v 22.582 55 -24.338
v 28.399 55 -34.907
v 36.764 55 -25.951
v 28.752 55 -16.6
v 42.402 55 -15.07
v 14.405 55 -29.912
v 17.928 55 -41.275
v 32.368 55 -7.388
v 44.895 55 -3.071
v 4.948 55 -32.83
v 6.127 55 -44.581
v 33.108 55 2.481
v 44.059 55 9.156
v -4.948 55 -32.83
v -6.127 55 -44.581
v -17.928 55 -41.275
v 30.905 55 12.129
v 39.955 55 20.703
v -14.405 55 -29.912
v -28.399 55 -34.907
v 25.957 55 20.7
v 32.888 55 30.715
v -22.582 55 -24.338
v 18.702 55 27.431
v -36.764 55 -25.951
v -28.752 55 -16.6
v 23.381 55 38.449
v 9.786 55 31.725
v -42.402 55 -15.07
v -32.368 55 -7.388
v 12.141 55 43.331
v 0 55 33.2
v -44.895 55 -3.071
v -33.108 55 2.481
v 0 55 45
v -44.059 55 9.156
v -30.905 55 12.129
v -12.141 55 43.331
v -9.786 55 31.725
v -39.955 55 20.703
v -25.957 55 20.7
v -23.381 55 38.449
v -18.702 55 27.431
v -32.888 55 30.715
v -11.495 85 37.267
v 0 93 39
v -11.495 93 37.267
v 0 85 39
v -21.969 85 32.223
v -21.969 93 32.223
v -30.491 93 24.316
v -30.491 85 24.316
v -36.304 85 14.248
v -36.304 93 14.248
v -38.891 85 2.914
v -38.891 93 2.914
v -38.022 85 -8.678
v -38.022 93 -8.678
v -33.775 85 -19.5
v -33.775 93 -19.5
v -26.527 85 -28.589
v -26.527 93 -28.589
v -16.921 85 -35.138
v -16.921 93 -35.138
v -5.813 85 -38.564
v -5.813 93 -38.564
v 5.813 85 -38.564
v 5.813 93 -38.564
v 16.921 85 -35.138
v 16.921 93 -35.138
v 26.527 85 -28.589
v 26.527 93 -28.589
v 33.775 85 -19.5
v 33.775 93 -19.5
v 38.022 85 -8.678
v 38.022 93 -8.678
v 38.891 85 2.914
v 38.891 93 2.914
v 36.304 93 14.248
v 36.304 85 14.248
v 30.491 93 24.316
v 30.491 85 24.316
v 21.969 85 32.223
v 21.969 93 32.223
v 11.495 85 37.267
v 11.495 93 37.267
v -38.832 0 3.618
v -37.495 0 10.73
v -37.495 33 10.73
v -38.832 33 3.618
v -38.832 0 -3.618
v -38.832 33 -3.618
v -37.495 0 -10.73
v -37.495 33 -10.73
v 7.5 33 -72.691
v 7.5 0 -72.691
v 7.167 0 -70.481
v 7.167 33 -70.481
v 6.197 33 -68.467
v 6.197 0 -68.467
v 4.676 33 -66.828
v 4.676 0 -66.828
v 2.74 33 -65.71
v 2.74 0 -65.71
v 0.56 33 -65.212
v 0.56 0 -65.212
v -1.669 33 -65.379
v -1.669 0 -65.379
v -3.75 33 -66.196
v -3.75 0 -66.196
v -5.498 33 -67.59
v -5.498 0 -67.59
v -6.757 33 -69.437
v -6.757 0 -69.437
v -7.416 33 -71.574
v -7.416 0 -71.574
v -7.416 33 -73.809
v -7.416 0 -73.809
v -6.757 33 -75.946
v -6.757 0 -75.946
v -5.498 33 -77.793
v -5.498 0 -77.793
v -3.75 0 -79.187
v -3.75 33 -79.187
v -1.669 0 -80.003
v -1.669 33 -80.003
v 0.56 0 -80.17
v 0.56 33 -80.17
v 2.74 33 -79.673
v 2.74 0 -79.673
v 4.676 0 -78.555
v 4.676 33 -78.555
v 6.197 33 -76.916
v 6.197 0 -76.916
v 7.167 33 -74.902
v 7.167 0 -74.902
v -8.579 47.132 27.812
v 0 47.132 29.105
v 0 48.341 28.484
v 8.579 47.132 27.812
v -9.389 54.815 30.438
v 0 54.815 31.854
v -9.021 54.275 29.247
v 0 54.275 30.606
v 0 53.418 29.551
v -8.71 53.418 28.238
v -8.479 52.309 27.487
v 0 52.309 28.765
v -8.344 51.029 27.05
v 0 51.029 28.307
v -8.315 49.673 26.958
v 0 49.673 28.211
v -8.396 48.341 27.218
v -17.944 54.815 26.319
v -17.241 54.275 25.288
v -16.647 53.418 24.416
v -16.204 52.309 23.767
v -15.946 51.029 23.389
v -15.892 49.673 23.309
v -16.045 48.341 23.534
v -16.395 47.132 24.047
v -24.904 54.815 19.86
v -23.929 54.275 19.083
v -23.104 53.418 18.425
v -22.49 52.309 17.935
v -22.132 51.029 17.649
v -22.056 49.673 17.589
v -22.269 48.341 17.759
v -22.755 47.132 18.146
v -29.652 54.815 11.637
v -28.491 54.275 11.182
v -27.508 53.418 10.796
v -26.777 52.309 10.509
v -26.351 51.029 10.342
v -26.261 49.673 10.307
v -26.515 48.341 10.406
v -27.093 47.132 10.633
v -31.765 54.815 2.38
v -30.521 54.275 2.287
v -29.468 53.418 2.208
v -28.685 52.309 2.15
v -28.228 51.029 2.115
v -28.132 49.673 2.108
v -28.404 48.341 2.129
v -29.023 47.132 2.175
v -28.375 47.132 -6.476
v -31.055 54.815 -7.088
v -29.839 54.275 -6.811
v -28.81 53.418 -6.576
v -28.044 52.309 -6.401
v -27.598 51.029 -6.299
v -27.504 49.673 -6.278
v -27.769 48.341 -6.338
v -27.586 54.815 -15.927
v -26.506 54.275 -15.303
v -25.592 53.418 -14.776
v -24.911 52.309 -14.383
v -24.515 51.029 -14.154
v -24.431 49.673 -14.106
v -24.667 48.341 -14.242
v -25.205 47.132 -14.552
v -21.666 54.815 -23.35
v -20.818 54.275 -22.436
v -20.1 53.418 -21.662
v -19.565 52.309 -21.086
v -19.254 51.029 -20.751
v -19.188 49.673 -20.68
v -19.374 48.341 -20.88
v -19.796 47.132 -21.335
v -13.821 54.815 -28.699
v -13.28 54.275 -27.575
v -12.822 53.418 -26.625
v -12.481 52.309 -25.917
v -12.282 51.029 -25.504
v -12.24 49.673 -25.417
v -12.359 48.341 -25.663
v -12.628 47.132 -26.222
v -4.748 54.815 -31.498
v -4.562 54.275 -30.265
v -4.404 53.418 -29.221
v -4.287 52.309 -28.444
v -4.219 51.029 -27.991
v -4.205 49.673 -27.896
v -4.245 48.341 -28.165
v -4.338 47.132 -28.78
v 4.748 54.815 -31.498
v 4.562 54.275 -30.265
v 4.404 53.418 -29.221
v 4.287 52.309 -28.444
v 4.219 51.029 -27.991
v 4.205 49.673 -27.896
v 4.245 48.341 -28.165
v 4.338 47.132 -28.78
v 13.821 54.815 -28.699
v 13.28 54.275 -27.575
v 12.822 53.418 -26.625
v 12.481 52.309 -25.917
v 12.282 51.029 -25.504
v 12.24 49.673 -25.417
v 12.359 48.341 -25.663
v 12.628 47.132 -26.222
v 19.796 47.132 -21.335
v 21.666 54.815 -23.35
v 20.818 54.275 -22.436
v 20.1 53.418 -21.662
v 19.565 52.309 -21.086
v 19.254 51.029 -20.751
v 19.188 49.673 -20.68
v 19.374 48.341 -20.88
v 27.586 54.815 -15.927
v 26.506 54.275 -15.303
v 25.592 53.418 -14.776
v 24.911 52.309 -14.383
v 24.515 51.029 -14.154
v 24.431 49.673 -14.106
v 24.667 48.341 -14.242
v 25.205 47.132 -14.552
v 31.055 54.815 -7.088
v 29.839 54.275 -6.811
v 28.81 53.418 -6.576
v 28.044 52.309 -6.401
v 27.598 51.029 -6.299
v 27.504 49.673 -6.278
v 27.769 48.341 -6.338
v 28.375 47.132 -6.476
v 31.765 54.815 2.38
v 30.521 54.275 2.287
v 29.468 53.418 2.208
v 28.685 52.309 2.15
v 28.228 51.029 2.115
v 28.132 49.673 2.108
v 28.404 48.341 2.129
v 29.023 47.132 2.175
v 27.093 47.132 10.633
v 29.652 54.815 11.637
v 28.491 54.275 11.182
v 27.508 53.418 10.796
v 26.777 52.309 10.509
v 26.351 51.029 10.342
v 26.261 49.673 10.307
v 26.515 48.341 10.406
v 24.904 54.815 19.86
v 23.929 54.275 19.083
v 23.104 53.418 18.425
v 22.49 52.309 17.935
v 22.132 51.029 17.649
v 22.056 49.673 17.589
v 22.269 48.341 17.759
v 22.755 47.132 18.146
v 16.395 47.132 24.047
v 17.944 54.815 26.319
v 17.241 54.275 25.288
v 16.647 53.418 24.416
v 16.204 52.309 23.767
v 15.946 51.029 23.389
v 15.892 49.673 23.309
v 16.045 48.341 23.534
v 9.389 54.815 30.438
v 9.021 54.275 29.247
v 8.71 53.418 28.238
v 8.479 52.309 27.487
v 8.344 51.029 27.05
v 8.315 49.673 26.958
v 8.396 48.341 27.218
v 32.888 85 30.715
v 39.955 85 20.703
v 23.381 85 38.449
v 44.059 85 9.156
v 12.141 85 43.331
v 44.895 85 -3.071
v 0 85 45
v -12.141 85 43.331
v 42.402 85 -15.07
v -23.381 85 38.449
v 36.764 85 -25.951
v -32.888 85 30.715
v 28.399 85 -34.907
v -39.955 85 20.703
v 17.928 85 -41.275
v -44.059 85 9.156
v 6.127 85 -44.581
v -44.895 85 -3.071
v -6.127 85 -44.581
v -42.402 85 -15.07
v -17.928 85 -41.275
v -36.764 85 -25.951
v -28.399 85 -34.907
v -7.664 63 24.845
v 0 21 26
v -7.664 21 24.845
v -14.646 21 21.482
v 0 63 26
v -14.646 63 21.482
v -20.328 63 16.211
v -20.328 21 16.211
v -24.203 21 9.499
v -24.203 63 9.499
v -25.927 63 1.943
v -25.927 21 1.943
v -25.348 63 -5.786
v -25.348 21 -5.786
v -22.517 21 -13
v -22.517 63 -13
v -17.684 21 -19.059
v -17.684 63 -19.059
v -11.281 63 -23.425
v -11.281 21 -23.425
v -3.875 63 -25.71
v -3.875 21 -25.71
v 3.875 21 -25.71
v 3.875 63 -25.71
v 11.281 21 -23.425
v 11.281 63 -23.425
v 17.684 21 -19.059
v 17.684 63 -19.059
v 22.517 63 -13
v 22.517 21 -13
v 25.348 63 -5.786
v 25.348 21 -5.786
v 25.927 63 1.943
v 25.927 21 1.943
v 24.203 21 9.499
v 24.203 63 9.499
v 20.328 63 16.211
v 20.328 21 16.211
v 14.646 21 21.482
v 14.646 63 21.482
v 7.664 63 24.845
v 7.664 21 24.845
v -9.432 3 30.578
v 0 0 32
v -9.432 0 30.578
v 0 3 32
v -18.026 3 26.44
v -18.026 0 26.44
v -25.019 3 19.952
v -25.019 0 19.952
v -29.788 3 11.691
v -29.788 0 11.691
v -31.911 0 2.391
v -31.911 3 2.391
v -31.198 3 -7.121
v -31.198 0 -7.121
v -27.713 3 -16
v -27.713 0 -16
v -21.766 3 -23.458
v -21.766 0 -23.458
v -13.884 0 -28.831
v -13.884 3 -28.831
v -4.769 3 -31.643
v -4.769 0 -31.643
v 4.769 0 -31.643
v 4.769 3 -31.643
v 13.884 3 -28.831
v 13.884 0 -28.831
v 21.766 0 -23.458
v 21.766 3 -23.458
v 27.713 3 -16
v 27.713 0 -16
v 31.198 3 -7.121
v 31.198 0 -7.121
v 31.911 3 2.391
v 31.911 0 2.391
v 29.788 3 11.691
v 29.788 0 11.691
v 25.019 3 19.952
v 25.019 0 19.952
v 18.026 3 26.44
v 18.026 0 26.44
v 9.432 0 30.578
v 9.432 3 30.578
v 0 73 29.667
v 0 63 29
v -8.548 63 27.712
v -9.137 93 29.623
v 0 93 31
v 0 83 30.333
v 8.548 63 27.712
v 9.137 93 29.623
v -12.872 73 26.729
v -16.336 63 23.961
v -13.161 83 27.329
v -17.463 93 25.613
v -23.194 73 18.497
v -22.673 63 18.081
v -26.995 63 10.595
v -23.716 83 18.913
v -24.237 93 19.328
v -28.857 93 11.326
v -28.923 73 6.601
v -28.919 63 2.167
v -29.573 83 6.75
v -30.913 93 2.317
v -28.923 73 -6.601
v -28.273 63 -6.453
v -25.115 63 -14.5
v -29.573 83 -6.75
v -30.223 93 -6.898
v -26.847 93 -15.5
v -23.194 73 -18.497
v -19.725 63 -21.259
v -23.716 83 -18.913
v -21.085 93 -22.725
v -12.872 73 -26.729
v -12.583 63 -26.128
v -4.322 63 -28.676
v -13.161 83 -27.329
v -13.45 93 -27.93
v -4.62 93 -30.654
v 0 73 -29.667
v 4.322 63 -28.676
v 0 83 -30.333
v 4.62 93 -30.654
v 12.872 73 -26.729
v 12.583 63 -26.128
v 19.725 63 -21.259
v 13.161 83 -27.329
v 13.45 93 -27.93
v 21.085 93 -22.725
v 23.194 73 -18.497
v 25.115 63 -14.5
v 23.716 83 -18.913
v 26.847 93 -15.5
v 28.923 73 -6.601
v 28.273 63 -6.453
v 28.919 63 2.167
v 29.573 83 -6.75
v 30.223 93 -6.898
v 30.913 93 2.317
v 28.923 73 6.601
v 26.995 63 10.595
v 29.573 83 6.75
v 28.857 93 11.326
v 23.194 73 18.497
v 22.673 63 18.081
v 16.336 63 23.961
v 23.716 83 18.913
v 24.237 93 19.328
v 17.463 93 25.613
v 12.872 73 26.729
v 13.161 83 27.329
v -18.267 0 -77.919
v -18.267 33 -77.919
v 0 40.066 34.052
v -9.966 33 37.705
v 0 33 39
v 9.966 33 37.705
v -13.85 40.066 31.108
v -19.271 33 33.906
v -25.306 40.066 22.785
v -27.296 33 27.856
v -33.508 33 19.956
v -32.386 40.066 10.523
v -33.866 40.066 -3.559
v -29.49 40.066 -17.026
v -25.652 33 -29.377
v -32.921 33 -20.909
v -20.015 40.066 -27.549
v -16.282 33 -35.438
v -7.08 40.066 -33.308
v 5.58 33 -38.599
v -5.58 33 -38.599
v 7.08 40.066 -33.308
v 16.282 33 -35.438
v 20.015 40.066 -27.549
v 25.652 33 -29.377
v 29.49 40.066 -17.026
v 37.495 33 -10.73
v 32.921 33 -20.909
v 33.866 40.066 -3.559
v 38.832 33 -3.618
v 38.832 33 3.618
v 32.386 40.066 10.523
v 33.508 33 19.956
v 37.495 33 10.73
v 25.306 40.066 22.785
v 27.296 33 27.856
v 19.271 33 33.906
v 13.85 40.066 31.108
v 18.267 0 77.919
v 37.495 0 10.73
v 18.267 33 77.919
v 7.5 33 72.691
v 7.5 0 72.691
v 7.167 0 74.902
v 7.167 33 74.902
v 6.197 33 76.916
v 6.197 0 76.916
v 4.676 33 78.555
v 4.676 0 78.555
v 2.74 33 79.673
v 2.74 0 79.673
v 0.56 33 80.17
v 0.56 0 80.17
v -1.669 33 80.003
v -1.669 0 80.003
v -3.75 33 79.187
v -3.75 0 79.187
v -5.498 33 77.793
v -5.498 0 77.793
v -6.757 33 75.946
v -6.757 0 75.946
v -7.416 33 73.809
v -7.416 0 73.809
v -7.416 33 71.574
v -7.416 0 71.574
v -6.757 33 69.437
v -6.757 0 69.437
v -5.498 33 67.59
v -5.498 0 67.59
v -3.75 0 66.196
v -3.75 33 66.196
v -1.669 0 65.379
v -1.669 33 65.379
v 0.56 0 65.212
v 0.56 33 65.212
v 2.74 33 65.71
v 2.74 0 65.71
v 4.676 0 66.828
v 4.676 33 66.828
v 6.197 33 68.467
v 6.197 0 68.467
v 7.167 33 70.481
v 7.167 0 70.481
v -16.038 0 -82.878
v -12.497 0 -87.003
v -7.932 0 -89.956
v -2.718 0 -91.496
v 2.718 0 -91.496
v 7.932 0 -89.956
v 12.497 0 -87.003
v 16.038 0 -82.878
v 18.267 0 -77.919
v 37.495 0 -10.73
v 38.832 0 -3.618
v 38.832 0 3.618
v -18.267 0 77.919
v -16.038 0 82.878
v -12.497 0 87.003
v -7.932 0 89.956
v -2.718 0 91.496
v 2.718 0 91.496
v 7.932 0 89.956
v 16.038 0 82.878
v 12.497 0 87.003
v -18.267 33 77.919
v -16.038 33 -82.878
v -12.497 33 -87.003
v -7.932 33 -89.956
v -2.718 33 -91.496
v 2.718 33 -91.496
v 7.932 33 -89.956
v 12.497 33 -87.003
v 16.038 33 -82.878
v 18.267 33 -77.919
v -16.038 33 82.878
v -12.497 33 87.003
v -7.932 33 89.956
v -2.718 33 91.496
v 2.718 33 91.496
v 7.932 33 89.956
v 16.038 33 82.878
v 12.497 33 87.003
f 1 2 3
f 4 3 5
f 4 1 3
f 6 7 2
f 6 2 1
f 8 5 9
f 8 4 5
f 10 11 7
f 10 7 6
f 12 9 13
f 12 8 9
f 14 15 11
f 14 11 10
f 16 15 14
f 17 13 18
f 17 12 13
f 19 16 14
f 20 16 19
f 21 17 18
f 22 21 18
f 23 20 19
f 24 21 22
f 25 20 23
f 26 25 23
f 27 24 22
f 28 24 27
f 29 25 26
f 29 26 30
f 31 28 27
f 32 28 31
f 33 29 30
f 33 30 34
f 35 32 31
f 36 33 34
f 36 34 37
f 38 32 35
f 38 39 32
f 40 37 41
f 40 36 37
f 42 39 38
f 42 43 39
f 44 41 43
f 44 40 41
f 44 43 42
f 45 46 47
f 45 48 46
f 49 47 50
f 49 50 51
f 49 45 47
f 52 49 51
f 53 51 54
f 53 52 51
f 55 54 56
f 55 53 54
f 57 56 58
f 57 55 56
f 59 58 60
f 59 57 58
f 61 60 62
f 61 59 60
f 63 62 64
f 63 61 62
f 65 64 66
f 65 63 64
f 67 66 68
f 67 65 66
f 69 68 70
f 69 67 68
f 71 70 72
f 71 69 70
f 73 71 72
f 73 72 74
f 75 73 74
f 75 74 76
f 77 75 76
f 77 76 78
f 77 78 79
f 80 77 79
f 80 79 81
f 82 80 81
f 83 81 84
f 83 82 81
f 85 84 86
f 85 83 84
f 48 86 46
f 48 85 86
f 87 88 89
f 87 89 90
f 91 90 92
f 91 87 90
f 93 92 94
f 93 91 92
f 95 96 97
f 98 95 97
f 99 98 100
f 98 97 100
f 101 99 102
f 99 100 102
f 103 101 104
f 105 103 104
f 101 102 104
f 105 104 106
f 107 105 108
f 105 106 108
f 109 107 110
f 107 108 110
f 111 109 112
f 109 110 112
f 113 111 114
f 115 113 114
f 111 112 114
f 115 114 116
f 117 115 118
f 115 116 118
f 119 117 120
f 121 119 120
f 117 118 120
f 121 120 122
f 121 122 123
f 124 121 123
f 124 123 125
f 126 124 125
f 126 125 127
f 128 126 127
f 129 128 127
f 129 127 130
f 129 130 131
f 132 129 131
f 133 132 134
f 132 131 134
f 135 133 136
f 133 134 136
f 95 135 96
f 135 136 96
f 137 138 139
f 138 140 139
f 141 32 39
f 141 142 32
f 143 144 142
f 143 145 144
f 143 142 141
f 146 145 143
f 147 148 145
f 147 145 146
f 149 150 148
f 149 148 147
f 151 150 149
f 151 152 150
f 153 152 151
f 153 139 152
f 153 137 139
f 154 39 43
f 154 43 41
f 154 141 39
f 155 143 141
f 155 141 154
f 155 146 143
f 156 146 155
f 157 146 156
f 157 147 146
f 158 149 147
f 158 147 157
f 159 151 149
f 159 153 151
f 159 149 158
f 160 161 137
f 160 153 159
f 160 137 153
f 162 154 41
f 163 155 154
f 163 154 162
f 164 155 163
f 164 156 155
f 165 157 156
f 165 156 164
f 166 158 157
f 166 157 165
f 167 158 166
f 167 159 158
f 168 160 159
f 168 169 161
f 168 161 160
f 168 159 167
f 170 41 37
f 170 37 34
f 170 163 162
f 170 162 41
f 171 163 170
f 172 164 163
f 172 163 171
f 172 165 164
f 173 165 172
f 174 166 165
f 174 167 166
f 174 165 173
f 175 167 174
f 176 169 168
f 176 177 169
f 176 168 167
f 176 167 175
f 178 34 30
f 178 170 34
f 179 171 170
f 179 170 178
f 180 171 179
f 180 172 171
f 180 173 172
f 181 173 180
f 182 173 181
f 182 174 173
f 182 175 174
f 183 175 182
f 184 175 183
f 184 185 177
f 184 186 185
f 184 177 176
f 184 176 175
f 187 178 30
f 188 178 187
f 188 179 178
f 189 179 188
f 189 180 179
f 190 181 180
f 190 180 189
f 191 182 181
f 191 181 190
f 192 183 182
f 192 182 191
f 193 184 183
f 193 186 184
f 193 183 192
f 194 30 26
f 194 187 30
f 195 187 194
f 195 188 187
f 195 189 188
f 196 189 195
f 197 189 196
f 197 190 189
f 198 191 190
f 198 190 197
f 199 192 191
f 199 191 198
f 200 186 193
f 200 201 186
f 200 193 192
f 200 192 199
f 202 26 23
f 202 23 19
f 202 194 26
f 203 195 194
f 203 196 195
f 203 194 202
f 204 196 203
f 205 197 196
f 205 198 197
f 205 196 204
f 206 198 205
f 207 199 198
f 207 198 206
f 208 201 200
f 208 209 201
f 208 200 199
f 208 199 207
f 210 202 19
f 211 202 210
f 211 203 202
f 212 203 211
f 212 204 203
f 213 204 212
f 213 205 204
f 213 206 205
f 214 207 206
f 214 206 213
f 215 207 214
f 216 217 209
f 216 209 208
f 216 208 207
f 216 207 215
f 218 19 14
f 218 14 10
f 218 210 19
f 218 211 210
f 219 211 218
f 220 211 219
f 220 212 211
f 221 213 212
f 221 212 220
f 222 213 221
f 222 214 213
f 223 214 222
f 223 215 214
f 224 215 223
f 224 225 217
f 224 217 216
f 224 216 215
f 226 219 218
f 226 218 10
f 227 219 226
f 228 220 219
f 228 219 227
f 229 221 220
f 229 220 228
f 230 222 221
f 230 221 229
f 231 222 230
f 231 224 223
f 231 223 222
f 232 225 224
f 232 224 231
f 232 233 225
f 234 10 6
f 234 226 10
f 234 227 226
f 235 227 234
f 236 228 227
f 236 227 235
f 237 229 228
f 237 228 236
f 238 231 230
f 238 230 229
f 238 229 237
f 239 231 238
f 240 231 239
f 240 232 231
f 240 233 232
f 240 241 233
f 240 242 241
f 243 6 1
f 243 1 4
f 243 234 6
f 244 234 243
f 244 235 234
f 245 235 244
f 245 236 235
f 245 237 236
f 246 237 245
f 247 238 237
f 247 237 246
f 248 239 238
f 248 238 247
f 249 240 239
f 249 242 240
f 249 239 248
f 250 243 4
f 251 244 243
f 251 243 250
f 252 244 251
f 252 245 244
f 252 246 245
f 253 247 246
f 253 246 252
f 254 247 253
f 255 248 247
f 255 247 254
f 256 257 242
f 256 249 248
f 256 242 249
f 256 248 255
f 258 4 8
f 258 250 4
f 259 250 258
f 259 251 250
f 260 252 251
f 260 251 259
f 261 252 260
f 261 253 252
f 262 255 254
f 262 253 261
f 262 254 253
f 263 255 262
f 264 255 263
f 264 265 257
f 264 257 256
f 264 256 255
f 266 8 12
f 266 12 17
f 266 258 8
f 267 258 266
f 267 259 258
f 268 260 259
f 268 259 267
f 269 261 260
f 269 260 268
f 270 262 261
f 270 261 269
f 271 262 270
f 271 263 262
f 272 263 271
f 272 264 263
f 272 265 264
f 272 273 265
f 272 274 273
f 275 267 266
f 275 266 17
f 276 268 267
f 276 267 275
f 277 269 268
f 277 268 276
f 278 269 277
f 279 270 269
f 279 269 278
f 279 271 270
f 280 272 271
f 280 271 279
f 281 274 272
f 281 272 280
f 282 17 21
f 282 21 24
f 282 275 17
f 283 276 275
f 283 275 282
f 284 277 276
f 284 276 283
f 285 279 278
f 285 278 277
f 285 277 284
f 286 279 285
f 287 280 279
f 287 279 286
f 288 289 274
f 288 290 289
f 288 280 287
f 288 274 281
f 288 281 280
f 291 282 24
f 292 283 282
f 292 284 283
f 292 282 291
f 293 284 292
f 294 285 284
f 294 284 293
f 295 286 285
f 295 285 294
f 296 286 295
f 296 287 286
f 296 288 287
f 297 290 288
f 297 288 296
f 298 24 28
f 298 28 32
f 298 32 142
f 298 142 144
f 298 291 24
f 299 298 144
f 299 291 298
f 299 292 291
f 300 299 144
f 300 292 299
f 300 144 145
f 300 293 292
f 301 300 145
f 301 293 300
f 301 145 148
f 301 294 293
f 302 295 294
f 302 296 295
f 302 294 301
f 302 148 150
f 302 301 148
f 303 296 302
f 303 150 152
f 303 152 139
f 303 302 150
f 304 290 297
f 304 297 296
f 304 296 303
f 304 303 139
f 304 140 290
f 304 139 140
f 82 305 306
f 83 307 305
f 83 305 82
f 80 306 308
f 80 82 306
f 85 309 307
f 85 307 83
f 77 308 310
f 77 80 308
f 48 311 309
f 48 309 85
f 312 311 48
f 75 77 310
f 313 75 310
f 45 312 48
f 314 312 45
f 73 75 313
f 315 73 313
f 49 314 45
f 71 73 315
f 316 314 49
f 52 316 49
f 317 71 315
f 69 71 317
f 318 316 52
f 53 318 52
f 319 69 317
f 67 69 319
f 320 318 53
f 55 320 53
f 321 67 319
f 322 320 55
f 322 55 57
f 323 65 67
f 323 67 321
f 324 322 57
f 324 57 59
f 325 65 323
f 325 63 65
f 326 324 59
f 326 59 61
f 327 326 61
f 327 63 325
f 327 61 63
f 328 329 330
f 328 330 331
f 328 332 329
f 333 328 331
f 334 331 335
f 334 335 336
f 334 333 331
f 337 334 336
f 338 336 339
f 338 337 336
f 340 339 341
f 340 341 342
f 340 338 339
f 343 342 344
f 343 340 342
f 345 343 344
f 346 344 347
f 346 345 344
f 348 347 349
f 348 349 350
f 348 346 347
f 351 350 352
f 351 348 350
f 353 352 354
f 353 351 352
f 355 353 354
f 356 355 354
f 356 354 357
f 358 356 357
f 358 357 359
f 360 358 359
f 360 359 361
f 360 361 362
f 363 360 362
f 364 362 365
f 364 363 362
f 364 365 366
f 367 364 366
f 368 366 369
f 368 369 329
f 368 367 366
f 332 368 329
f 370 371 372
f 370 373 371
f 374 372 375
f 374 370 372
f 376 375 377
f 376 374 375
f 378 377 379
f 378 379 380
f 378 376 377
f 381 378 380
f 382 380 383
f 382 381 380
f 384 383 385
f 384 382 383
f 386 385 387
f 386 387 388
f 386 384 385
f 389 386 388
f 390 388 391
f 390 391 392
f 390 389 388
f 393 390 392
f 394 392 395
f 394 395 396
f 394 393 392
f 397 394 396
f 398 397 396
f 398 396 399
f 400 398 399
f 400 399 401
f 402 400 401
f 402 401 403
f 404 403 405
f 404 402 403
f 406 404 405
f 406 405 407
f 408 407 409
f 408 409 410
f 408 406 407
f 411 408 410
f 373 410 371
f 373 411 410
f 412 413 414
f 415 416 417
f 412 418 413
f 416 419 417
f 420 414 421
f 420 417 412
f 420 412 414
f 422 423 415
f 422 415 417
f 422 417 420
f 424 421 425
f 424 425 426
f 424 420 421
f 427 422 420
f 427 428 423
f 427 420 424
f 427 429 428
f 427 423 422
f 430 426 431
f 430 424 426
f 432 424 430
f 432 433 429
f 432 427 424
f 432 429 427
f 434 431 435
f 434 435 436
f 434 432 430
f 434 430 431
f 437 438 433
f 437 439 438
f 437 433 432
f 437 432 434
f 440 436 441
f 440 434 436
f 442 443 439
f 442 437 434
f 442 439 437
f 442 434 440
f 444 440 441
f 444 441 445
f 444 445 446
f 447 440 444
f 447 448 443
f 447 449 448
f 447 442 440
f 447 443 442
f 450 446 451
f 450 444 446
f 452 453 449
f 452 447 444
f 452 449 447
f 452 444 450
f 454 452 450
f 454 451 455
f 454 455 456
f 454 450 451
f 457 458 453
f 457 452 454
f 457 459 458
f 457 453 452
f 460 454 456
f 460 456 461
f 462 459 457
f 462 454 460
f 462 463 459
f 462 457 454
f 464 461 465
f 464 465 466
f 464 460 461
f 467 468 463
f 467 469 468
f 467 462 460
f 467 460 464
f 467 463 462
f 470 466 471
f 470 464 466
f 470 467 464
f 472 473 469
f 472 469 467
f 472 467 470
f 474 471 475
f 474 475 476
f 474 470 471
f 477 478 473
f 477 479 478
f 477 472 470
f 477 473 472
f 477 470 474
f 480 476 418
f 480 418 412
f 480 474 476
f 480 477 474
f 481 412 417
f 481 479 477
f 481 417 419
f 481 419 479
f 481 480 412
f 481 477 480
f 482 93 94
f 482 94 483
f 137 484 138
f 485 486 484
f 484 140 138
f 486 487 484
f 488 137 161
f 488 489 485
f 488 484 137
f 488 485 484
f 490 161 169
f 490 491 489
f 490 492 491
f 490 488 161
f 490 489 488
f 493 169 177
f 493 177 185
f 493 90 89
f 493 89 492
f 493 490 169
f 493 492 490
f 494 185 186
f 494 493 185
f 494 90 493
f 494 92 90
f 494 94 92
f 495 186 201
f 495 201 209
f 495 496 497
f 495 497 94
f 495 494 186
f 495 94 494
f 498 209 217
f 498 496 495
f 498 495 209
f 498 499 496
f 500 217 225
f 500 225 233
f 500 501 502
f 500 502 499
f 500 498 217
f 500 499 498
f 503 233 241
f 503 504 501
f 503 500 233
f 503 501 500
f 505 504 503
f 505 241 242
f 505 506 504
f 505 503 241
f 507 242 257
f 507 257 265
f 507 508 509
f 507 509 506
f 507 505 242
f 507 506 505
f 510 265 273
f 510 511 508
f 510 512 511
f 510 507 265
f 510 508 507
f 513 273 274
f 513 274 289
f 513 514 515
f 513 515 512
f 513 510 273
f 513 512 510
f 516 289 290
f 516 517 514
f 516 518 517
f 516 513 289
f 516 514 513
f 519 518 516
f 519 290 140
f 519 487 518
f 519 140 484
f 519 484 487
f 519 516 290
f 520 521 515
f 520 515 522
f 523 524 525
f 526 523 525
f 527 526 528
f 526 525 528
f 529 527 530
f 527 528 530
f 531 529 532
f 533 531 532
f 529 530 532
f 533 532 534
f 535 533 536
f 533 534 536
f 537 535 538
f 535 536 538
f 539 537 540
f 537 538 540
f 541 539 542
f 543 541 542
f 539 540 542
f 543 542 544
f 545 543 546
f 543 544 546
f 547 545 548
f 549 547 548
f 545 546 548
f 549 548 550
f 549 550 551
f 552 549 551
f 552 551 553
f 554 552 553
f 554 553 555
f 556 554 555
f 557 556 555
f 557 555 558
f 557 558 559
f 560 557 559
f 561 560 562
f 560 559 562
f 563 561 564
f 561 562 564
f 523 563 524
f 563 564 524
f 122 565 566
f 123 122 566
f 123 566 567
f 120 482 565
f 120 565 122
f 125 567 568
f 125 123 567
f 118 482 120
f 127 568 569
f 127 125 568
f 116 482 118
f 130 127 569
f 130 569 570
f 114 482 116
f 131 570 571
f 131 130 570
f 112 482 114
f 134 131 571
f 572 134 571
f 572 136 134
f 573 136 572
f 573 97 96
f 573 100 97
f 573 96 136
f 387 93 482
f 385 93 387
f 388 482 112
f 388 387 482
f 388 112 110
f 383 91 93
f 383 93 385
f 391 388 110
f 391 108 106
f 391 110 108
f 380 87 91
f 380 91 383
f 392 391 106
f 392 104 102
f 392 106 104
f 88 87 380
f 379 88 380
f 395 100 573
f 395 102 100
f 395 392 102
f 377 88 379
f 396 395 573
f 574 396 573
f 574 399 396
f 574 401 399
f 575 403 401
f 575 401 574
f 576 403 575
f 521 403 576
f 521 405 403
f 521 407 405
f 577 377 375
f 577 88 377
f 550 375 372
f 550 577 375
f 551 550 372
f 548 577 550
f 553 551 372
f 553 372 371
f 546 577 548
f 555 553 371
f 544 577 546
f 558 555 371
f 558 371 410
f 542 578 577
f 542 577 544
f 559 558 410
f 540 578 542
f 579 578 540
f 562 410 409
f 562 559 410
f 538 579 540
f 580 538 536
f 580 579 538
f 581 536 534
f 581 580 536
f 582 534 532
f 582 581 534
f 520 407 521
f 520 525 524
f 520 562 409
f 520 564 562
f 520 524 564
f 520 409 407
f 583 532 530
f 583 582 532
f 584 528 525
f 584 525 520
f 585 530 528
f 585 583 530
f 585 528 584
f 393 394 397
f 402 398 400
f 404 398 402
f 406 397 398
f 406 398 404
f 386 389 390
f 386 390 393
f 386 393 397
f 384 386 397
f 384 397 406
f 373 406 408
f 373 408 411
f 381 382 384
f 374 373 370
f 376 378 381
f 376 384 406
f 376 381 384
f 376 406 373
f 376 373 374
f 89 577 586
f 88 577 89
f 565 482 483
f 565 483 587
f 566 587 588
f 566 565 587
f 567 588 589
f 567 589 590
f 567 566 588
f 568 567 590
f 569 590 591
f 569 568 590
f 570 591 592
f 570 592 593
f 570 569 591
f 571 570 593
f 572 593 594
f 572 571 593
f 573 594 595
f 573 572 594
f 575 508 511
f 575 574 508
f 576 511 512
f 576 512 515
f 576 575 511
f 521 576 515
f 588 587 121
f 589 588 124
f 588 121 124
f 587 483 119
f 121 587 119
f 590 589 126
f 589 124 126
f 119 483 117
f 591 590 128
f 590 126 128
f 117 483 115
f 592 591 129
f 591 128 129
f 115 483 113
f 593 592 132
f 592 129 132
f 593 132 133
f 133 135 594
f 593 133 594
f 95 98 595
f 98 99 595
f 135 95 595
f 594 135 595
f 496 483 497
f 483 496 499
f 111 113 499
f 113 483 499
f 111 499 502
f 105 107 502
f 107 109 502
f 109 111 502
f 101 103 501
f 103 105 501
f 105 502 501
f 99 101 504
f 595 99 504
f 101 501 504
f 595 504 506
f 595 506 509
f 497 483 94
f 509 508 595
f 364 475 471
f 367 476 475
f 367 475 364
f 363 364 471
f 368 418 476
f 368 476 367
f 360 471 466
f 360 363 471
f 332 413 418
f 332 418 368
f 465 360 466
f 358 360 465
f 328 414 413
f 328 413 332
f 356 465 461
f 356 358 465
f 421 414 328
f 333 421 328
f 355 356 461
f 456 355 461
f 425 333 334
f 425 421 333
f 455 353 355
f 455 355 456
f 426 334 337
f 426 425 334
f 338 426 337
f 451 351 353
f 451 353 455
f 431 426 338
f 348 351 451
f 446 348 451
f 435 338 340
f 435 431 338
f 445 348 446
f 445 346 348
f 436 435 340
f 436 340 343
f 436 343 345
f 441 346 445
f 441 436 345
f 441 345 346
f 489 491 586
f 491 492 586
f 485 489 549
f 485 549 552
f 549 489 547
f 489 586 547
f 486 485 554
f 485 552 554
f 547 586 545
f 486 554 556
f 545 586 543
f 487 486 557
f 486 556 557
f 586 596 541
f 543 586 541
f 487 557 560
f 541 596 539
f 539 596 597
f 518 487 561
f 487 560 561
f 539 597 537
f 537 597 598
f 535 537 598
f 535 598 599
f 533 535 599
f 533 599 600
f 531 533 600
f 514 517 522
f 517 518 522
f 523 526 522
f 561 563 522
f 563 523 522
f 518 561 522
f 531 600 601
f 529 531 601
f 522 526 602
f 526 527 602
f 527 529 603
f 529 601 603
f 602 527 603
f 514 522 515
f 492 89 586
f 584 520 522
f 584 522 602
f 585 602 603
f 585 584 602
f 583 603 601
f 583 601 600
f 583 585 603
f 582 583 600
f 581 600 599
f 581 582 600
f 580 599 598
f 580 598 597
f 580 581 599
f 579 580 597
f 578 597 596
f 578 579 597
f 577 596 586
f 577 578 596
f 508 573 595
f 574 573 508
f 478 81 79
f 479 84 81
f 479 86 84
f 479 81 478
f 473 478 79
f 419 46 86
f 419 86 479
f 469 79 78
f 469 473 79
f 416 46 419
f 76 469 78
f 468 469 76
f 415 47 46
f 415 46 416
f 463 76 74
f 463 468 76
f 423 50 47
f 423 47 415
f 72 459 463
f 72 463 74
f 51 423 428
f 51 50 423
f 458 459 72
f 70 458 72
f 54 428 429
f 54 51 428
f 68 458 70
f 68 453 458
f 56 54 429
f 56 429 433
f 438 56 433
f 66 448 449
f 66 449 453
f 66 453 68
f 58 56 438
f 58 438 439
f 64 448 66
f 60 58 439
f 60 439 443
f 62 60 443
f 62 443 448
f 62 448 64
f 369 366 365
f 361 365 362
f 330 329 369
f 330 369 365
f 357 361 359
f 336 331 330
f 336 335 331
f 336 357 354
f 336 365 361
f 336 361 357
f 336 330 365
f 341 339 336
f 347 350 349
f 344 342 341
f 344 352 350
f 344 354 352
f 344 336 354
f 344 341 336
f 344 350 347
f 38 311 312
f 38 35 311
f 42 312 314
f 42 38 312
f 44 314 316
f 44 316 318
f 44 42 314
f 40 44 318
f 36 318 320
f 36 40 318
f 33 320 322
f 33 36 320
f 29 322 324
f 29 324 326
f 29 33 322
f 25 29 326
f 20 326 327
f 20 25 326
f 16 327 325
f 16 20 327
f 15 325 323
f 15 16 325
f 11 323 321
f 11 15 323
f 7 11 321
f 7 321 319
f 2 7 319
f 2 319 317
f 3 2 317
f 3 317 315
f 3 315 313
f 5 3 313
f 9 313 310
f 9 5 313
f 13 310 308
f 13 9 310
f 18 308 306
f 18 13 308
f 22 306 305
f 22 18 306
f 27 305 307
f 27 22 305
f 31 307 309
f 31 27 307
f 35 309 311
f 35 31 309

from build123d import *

# Parameters (mm, degrees)
F2_R     = 7.5
F3_DEPTH = 33


with BuildPart() as f1:
    # F0 (on Right) → F1 (revolve)
    with BuildSketch(Plane.YZ):
        with BuildLine():
            Line((3, 32), (3, 0))
            Line((3, 0), (21, 0))
            Line((21, 0), (21, 26))
            Line((21, 26), (63, 26))
            Line((63, 26), (63, 29))
            Line((63, 29), (93, 31))
            Line((93, 31), (93, 39))
            Line((93, 39), (85, 39))
            Line((85, 39), (85, 45))
            Line((85, 45), (55, 45))
            Line((55, 45), (55, 33.200345))
            ThreePointArc((55, 33.200345), (52.308743, 28.765291), (47.132118, 29.104585))
            Line((47.132118, 29.104585), (33, 39))
            Line((33, 39), (0, 39))
            Line((0, 39), (0, 32))
            Line((0, 32), (3, 32))
        make_face()
    revolve(axis=Axis((0, 12, 0), (0, -1, 0)))

    # F2 (on Front) → F3 (join)
    with BuildSketch(Plane.XZ):
        with BuildLine():
            Line((37.494811, 10.730289), (18.266703, 77.918999))
            ThreePointArc((18.266703, 77.918999), (0, 91.691422), (-18.266703, 77.918999))
            Line((-18.266703, 77.918999), (-37.494811, 10.730289))
            ThreePointArc((-37.494811, 10.730289), (0, 39), (37.494811, 10.730289))
        make_face()
        with Locations((0, 72.691422)):
            Circle(F2_R, mode=Mode.SUBTRACT)
        with BuildLine():
            ThreePointArc((37.494811, -10.730289), (0, -39), (-37.494811, -10.730289))
            Line((-37.494811, -10.730289), (-18.266703, -77.918999))
            ThreePointArc((-18.266703, -77.918999), (0, -91.691422), (18.266703, -77.918999))
            Line((18.266703, -77.918999), (37.494811, -10.730289))
        make_face()
        with Locations((0, -72.691422)):
            Circle(F2_R, mode=Mode.SUBTRACT)
    extrude(amount=-F3_DEPTH)


solid = f1.part
